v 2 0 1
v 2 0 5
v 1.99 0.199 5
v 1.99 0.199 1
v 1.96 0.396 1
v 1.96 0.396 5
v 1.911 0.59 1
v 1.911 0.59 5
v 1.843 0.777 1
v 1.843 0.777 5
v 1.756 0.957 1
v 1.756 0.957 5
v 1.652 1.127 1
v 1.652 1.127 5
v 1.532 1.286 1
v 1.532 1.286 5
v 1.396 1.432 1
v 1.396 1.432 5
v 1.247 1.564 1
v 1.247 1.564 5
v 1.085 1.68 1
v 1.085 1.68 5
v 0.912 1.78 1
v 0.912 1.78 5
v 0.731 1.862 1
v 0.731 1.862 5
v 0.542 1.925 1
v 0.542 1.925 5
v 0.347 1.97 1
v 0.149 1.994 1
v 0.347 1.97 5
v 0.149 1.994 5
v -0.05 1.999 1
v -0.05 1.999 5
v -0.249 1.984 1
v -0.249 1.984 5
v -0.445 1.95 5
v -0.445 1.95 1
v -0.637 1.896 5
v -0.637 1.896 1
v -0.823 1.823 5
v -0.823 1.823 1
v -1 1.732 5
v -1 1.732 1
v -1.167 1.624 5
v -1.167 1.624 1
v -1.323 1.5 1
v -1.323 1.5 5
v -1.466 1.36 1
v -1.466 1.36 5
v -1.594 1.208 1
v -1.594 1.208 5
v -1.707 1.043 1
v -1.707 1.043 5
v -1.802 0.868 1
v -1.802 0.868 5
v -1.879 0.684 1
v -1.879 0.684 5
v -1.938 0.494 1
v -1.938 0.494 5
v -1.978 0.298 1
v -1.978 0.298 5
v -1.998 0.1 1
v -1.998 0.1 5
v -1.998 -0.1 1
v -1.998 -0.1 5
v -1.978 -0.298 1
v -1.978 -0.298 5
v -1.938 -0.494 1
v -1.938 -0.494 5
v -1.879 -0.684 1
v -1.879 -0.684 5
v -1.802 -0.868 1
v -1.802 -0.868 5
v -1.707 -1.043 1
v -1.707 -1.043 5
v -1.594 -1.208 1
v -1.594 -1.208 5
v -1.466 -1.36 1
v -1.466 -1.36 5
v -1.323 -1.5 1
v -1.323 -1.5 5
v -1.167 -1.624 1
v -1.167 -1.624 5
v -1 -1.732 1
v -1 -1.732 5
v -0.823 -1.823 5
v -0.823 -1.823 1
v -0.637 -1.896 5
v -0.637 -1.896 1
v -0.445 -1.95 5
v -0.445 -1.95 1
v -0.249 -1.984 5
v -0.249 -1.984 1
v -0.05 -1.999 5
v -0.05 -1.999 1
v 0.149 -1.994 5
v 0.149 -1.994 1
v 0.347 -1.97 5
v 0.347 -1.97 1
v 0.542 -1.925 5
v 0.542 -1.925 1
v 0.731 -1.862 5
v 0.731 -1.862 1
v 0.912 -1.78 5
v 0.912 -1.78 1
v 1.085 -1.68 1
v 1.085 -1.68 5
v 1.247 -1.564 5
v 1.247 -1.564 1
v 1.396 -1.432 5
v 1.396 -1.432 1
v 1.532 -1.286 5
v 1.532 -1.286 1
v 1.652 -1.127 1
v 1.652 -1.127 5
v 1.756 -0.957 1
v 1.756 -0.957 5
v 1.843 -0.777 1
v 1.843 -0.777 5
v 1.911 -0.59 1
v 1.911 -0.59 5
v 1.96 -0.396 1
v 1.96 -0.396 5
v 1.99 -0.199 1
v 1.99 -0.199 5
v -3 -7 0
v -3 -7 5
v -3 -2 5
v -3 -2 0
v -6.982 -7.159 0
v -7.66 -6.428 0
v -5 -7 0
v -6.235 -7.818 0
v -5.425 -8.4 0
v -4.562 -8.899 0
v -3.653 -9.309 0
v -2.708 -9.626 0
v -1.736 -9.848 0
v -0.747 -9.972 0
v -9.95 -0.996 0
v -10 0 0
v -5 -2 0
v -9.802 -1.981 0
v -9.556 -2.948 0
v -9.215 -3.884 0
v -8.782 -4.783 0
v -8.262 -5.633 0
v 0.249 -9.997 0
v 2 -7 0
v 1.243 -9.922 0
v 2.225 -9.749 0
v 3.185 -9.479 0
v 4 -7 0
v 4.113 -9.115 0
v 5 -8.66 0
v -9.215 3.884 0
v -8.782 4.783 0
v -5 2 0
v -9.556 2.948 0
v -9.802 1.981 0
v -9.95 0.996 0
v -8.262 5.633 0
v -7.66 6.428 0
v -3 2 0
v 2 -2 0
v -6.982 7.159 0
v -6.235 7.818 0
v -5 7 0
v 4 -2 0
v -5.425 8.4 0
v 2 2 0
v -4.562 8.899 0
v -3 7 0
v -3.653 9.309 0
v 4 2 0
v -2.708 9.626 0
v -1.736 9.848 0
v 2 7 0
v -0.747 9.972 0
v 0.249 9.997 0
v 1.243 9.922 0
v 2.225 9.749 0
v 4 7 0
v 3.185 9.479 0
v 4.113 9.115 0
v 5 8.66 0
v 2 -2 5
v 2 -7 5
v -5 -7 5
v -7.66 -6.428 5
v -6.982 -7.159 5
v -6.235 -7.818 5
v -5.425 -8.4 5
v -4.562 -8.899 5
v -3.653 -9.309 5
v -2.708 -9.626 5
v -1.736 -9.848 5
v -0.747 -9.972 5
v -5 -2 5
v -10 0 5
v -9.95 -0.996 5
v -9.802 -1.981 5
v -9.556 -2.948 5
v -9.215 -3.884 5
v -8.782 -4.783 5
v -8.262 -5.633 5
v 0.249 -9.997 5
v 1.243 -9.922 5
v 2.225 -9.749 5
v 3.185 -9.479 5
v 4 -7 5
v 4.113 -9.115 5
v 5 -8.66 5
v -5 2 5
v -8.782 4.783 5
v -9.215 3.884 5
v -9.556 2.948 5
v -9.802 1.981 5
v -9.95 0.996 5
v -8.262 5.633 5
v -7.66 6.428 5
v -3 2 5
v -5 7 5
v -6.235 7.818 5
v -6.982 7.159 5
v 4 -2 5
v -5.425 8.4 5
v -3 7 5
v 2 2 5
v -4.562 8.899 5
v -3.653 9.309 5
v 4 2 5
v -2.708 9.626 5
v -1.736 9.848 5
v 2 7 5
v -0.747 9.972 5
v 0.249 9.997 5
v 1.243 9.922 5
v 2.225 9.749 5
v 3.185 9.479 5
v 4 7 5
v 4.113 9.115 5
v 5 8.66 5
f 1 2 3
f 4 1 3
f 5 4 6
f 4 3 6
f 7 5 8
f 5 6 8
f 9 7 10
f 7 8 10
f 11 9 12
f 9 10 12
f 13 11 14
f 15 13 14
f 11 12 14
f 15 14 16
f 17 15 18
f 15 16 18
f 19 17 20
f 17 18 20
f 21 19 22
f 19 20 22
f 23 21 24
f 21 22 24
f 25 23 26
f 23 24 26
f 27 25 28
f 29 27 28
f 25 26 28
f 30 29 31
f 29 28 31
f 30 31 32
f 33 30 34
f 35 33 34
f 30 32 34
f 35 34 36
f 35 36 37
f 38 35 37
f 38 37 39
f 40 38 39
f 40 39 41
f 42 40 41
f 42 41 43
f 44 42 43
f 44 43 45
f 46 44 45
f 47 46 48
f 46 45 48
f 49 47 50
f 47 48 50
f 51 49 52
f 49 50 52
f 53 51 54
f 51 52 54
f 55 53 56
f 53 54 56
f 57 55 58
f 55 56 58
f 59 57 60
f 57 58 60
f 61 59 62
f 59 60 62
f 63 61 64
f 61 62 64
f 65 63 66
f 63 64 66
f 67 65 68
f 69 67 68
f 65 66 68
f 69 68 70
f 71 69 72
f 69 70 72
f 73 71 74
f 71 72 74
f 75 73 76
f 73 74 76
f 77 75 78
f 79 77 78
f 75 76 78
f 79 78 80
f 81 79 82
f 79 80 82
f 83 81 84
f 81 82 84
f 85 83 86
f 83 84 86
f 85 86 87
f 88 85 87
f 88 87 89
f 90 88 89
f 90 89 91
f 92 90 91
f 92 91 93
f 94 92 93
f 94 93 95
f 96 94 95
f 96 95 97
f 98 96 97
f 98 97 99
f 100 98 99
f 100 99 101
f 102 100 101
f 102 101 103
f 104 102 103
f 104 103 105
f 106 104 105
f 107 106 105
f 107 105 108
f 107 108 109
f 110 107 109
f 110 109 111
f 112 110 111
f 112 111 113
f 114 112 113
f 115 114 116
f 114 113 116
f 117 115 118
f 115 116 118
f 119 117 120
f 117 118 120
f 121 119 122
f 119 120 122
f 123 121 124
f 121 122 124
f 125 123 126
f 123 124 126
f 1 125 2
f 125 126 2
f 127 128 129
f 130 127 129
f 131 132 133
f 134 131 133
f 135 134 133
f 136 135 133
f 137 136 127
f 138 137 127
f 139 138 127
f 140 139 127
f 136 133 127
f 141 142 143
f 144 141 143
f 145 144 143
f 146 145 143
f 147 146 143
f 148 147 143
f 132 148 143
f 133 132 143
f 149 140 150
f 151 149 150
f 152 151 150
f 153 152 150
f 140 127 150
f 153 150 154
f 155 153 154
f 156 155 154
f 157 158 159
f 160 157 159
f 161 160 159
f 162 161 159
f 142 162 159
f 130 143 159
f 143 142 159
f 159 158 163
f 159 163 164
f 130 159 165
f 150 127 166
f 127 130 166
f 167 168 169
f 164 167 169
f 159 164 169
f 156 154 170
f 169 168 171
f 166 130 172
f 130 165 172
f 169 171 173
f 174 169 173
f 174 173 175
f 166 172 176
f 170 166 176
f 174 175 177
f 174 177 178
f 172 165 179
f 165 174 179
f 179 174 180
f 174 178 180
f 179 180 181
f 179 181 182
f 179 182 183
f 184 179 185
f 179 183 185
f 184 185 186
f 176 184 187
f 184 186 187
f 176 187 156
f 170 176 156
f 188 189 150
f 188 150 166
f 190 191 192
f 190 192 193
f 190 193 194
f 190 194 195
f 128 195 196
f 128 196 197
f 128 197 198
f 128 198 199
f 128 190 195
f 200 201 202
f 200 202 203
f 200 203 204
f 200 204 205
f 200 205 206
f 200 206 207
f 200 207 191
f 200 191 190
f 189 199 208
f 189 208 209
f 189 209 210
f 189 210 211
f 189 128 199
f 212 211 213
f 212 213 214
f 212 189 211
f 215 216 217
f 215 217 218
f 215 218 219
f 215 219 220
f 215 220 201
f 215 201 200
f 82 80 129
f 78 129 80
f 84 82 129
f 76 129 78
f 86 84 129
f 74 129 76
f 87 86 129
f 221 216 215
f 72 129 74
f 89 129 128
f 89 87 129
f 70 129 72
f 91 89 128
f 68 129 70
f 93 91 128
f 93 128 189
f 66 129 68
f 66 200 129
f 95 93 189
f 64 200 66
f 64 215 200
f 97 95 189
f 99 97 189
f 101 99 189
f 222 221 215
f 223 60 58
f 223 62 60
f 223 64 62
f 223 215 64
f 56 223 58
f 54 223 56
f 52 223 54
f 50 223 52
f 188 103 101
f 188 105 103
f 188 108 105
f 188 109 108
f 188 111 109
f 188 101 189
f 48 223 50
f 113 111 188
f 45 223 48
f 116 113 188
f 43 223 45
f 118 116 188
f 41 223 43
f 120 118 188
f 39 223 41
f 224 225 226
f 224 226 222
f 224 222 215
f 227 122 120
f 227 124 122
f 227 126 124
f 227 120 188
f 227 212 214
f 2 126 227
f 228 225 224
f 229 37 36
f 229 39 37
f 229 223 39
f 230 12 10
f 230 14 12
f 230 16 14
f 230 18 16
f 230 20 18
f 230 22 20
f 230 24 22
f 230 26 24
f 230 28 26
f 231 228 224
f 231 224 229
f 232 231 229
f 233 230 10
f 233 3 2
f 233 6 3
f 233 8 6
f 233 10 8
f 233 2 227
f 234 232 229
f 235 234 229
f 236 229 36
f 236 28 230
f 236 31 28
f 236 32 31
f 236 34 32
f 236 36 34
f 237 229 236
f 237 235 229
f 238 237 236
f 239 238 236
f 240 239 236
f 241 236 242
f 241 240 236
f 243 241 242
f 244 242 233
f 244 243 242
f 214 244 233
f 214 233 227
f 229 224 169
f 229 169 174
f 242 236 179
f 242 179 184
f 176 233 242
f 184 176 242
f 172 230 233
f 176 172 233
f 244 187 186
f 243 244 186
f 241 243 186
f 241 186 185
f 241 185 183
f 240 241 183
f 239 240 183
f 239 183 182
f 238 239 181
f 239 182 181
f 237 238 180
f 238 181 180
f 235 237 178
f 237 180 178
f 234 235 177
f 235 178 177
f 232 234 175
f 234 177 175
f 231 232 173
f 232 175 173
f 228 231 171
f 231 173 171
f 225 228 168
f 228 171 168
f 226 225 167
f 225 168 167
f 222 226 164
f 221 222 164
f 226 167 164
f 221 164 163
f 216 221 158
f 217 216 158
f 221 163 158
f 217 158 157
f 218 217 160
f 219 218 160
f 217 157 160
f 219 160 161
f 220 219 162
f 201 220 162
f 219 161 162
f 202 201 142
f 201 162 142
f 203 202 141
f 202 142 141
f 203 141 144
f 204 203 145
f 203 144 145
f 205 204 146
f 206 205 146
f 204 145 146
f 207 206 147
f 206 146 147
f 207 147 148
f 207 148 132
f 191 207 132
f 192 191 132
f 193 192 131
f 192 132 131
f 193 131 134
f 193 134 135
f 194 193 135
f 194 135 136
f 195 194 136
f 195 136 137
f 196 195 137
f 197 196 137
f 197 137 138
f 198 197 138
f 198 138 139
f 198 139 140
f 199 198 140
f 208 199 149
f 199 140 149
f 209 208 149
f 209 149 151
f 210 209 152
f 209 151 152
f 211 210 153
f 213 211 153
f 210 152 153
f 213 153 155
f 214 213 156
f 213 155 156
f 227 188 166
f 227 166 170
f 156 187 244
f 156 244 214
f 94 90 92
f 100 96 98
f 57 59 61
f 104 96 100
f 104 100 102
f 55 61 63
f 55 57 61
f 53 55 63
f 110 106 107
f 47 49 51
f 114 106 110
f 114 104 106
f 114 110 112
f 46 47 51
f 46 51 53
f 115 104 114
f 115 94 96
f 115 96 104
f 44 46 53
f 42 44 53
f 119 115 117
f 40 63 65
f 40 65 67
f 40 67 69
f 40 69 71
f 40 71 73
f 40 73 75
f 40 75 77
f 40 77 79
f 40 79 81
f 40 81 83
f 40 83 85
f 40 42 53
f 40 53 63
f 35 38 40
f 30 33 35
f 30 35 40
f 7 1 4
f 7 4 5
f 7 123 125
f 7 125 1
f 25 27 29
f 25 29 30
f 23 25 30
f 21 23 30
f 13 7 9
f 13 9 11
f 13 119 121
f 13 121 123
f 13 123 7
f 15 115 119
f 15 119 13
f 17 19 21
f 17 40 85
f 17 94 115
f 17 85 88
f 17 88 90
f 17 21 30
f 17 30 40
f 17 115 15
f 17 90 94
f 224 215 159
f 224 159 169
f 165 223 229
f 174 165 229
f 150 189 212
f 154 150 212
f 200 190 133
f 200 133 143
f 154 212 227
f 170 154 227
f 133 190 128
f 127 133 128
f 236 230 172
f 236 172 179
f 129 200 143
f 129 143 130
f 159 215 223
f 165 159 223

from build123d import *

# Parameters (mm, degrees)
PAD003_DEPTH    = 5
SKETCH008_W     = 2
SKETCH008_H     = 5
POCKET004_DEPTH = 5
SKETCH009_R     = 2
POCKET005_DEPTH = 4


with BuildPart() as part:
    # Sketch007 → Pad003 (new body)
    with BuildSketch(Plane.XY):
        with BuildLine():
            ThreePointArc((5, 8.660254), (-10, 0), (5, -8.660254))
            Line((5, 8.660254), (5, -8.660254))
        make_face()
    extrude(amount=PAD003_DEPTH)

    # Sketch008 → Pocket004 (cut)
    with BuildSketch(Plane.XY.offset(5)):
        with Locations((-4, 4.5)):
            Rectangle(SKETCH008_W, SKETCH008_H)
        with Locations((3, 4.5)):
            Rectangle(SKETCH008_W, SKETCH008_H)
        with Locations((3, -4.5)):
            Rectangle(SKETCH008_W, SKETCH008_H)
        with Locations((-4, -4.5)):
            Rectangle(SKETCH008_W, SKETCH008_H)
    extrude(amount=-POCKET004_DEPTH, mode=Mode.SUBTRACT)

    # Sketch009 → Pocket005 (cut)
    with BuildSketch(Plane.XY.offset(5)):
        Circle(SKETCH009_R)
    extrude(amount=-POCKET005_DEPTH, mode=Mode.SUBTRACT)


solid = part.part
